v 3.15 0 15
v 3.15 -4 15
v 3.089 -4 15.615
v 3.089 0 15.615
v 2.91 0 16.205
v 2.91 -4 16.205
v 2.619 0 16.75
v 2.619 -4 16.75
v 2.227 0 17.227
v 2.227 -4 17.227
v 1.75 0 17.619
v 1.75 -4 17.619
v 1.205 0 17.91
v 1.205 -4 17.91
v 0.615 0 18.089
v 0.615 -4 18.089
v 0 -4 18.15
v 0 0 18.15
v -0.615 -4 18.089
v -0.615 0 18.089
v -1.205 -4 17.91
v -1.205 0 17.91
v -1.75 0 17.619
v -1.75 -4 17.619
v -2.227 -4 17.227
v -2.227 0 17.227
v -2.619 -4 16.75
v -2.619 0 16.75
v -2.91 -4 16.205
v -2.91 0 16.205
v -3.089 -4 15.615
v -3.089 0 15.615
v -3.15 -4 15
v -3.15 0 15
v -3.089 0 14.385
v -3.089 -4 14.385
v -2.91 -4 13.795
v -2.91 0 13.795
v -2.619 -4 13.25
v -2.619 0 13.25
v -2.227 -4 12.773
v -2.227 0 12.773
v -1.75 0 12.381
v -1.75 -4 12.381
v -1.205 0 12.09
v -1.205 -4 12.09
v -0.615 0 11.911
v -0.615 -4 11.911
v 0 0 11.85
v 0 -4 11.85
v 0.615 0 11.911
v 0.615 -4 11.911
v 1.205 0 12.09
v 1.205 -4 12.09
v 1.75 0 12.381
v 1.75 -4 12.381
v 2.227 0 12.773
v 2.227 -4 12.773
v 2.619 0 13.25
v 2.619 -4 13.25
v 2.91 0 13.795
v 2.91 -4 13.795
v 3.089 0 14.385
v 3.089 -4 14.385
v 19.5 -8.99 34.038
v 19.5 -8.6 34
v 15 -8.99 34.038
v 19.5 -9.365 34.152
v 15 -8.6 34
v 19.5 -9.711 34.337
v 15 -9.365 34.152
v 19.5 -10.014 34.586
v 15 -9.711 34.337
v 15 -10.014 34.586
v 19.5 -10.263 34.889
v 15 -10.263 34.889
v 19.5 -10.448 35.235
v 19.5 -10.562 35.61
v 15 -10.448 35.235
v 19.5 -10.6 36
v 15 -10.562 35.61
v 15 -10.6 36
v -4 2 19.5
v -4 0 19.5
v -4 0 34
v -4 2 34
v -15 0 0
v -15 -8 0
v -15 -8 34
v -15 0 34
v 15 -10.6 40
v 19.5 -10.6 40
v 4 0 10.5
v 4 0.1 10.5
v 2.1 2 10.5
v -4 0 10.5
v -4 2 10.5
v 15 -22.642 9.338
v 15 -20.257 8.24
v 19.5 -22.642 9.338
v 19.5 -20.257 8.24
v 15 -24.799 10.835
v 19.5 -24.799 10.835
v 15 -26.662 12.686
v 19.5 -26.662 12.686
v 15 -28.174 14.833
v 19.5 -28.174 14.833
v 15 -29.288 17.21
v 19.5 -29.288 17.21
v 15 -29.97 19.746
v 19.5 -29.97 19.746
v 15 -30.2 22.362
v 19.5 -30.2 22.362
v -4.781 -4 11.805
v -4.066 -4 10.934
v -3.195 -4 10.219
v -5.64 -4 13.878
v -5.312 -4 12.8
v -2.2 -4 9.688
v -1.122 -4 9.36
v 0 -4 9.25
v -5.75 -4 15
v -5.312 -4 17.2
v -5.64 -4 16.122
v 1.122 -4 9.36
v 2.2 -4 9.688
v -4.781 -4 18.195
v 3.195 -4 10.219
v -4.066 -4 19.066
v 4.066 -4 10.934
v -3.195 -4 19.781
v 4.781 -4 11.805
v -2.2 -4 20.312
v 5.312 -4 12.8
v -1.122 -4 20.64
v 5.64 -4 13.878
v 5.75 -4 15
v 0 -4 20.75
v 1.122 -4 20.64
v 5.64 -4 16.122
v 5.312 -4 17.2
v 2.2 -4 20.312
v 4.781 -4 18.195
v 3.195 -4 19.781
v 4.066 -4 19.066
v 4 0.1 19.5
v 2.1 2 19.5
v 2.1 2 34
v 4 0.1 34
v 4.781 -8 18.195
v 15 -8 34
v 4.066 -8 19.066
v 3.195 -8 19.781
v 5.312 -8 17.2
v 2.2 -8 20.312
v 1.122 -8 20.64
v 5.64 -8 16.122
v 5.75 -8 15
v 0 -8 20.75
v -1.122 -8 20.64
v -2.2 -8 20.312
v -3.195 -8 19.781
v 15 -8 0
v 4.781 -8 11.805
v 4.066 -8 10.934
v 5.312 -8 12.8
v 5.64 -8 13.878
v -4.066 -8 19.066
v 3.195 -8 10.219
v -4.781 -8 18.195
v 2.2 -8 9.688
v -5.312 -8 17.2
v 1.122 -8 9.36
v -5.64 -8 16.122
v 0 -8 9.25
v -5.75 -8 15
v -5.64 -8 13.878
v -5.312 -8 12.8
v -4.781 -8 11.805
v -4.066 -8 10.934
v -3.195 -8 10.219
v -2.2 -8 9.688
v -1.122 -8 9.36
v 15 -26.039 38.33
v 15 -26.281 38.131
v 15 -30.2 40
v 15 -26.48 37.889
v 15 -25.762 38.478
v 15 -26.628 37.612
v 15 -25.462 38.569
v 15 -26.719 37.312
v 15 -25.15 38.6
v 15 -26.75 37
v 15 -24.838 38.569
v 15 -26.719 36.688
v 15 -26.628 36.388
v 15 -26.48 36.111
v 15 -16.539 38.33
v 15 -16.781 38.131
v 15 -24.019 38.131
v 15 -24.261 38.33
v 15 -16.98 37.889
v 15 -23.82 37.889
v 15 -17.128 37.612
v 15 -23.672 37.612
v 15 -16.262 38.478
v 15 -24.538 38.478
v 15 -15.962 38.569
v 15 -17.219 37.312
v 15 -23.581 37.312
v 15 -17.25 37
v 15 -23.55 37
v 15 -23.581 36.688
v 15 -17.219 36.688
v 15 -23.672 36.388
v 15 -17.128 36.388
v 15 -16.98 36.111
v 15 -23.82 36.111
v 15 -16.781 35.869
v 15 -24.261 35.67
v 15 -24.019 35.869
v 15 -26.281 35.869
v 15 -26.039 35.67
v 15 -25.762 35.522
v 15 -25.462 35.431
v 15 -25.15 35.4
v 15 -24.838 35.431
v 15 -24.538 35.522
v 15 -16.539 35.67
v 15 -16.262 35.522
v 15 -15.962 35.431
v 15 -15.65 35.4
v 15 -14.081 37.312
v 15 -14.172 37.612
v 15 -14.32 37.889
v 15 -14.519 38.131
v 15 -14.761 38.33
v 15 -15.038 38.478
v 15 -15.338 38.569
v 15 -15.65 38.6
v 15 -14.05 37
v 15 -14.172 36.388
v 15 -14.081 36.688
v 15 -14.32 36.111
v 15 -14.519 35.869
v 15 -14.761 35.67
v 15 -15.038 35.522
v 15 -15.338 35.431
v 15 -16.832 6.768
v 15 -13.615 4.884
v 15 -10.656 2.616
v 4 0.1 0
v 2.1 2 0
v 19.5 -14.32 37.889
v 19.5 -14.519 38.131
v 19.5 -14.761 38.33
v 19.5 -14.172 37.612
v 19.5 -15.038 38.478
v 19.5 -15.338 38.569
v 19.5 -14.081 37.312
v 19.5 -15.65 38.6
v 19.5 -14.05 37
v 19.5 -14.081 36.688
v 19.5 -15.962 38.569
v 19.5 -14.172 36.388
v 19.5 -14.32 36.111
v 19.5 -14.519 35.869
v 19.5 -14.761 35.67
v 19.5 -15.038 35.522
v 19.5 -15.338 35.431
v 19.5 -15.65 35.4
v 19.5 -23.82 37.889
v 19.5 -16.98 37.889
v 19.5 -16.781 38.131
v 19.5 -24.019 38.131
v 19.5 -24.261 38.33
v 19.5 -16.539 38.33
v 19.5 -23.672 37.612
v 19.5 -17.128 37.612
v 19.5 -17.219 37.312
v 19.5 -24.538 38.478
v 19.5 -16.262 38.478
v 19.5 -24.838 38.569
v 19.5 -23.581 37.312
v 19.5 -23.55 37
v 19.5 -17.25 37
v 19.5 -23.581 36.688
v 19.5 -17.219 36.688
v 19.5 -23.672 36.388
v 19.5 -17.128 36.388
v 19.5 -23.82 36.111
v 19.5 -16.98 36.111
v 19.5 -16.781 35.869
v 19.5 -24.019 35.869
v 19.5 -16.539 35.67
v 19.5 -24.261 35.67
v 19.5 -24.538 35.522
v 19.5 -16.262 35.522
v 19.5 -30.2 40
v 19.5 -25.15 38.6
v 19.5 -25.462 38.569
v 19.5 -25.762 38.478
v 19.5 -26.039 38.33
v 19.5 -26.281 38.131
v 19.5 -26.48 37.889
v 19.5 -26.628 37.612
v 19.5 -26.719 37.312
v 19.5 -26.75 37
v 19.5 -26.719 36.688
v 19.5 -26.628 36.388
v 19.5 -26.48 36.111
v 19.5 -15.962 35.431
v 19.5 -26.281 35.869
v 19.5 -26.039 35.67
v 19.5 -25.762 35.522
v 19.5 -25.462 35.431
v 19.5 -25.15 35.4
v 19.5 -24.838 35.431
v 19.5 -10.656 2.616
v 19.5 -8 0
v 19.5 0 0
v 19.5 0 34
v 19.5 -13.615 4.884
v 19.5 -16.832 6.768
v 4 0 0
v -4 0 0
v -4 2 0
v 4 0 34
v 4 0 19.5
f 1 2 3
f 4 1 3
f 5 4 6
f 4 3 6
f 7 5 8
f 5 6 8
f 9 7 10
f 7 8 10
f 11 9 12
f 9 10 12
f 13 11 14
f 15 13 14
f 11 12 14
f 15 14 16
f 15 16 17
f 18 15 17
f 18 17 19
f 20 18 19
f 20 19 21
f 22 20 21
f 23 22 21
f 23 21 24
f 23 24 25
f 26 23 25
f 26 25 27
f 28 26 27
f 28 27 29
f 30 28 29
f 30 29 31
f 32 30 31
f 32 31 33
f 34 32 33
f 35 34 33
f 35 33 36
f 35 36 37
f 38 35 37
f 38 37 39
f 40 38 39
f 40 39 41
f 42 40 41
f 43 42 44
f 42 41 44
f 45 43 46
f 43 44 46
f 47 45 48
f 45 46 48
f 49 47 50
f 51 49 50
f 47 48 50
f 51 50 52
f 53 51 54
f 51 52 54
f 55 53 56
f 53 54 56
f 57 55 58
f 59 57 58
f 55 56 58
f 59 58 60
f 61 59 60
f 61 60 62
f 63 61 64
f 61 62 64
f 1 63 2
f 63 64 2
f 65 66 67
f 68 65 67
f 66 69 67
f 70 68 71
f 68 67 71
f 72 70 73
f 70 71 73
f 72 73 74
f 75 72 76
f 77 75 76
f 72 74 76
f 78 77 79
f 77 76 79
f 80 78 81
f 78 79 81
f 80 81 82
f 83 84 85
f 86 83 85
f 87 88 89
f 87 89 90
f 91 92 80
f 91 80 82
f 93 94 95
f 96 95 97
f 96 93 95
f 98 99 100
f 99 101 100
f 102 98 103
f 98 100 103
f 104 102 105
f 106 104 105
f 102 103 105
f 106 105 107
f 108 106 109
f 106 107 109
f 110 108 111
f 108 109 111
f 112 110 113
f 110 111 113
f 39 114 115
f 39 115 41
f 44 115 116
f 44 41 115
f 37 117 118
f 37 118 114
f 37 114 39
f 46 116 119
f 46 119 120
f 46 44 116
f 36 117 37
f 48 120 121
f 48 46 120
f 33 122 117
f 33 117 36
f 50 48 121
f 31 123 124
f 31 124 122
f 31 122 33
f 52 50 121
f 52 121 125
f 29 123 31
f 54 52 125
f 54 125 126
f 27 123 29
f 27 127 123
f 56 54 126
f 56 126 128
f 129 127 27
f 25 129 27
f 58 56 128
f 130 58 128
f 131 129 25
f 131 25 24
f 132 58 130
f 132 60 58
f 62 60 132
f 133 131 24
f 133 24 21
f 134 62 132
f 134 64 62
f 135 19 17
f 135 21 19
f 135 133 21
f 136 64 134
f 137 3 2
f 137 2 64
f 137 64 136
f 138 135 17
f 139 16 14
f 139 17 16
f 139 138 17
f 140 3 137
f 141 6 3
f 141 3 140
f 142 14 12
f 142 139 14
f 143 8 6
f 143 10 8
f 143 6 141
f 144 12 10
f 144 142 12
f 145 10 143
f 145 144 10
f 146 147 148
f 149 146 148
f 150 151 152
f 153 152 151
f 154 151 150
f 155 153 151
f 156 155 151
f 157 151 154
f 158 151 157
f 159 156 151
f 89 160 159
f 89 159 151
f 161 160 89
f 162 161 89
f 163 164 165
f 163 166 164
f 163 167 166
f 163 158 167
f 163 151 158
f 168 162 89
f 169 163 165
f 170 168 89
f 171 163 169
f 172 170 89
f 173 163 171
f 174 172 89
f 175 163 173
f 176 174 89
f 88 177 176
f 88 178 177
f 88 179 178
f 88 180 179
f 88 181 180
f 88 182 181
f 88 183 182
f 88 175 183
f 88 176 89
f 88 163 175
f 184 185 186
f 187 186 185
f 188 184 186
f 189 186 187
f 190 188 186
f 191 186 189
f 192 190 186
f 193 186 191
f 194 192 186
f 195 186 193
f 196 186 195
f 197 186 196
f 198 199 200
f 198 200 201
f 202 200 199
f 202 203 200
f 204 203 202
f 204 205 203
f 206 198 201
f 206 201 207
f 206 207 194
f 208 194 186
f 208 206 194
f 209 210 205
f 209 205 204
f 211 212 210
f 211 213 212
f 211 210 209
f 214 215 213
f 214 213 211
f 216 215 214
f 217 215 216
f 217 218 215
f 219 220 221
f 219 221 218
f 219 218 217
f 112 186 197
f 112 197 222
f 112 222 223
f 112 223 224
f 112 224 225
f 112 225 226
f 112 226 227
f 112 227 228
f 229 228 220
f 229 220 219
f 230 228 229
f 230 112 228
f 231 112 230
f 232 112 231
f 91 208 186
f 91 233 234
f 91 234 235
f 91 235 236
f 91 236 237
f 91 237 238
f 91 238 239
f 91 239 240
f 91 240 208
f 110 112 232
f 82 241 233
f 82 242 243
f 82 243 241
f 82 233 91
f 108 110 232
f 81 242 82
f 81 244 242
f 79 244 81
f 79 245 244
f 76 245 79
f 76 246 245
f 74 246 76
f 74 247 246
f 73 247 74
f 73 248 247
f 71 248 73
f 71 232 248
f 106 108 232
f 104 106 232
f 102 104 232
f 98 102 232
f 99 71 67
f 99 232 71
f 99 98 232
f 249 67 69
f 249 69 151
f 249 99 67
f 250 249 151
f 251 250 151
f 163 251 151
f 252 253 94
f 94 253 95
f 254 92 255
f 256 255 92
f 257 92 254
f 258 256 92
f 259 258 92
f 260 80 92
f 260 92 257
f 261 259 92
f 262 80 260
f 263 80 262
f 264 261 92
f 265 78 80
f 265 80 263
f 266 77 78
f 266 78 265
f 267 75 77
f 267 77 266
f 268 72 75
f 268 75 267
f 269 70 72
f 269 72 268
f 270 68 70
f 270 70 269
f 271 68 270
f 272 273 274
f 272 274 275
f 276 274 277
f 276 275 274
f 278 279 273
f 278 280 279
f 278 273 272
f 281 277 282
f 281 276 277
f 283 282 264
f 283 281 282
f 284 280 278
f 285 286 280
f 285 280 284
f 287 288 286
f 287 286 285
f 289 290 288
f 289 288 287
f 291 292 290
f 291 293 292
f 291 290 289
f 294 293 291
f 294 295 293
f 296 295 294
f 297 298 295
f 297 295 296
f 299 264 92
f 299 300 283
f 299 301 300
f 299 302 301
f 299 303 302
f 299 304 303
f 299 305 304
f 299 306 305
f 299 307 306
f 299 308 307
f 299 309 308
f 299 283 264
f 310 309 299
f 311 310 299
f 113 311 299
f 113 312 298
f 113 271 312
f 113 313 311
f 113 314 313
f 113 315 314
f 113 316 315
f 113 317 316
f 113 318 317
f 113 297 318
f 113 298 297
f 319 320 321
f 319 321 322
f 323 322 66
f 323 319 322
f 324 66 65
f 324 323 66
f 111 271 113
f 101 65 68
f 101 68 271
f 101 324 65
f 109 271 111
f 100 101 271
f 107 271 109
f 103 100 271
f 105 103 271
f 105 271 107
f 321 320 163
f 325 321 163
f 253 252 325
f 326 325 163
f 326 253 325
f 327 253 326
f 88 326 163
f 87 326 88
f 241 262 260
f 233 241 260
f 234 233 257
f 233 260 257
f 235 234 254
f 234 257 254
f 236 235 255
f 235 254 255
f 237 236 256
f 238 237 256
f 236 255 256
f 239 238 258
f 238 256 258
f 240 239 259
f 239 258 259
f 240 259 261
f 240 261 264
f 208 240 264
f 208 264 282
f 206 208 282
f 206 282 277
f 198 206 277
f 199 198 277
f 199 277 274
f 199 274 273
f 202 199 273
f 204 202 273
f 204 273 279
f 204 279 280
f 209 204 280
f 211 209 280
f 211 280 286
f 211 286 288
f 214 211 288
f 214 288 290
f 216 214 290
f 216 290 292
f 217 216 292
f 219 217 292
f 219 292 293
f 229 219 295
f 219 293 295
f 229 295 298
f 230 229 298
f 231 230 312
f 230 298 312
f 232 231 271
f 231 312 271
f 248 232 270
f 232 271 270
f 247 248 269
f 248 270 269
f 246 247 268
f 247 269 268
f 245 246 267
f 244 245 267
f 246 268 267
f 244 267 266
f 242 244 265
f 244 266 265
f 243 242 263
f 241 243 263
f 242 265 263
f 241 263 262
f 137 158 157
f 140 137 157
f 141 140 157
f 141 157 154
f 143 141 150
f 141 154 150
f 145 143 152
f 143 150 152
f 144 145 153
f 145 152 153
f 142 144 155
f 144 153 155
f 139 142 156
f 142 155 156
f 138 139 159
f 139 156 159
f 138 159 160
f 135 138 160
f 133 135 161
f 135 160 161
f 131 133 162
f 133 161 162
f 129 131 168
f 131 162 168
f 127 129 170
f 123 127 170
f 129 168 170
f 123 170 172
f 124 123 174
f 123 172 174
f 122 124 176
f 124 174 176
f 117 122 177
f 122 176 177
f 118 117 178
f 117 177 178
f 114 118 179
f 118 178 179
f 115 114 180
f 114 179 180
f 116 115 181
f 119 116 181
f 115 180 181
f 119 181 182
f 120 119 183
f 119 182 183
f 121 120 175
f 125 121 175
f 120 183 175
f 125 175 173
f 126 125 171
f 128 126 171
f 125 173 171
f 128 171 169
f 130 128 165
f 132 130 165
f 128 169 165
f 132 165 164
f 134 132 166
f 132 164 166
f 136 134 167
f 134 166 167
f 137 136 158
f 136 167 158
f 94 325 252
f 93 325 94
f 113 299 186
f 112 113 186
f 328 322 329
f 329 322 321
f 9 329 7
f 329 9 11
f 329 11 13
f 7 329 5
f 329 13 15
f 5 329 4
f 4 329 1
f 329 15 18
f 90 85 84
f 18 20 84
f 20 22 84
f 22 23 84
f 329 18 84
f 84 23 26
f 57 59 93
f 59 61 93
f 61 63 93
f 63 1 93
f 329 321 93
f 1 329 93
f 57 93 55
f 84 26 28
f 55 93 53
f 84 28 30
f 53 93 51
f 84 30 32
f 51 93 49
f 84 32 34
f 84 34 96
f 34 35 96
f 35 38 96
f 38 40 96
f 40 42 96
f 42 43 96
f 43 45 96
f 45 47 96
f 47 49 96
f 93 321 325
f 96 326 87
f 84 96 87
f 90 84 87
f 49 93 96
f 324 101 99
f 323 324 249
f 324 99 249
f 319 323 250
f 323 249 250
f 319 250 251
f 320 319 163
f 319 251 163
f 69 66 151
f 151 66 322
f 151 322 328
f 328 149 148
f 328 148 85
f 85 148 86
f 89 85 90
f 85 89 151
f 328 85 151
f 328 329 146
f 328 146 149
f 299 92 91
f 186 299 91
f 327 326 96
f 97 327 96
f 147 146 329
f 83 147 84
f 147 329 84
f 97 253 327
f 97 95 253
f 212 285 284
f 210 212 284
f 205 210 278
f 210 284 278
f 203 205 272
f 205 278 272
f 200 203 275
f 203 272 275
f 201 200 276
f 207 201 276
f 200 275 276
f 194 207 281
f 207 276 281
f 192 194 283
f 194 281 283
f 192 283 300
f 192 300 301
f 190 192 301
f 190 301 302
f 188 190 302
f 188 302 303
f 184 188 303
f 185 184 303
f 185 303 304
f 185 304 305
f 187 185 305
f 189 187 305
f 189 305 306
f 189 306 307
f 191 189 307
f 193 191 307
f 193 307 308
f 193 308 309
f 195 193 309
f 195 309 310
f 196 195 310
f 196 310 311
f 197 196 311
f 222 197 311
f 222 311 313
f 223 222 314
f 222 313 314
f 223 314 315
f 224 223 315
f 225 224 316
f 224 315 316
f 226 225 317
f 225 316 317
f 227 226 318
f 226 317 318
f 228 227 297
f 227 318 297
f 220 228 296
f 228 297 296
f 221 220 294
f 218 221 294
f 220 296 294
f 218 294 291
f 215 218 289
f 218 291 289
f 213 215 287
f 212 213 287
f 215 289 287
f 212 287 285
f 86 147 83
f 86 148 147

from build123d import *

# Parameters (mm, degrees)
PAD_DEPTH       = 40
SKETCH001_R     = 3.15
POCKET_DEPTH    = 8.001
POCKET001_DEPTH = 6
SKETCH003_R     = 5.75
POCKET002_DEPTH = 4
POCKET003_DEPTH = 4.501
FILLET_R        = 15
FILLET001_R     = 2
SKETCH005_R     = 1.6
POCKET004_DEPTH = 34.501
SKETCH006_W     = 8
SKETCH006_H     = 14.5
SKETCH006_H_2   = 10.5
PAD001_DEPTH    = 2
CHAMFER_SIZE    = 1.9


with BuildPart() as part:
    # Sketch → Pad (new body)
    with BuildSketch(Plane.XY):
        Polygon((-15, 0), (15, 0), (19.5, 0), (19.5, -30.2), (15, -30.2), (15, -8), (-15, -8), align=None)
    extrude(amount=PAD_DEPTH)

    # Sketch001 (on Face6 of Pad) → Pocket (cut, through all)
    with BuildSketch(Plane.XZ.offset(8)):
        with Locations((0, 15)):
            Circle(SKETCH001_R)
    extrude(amount=-POCKET_DEPTH, mode=Mode.SUBTRACT)

    # Sketch002 (on Face4 of Pocket) → Pocket001 (cut)
    with BuildSketch(Plane.XY.offset(40)):
        Polygon((-15, 0), (19.5, 0), (19.5, -10.6), (15, -10.6), (15, -8), (-15, -8), align=None)
    extrude(amount=-POCKET001_DEPTH, mode=Mode.SUBTRACT)

    # Sketch003 (on Face10 of Pocket001) → Pocket002 (cut)
    with BuildSketch(Plane.XZ.offset(8)):
        with Locations((0, 15)):
            Circle(SKETCH003_R)
    extrude(amount=-POCKET002_DEPTH, mode=Mode.SUBTRACT)

    # Sketch004 (on Face9 of Pocket002) → Pocket003 (cut, through all)
    with BuildSketch(Plane(origin=(15, 0, 0), x_dir=(0, -1, 0), z_dir=(-1, 0, 0))):
        with BuildLine():
            ThreePointArc((30.2, 10), (18.043042, 7.346447), (8, 0))
            Line((30.2, 0), (8, 0))
            Line((30.2, 10), (30.2, 0))
        make_face()
    extrude(amount=-POCKET003_DEPTH, mode=Mode.SUBTRACT)

    # Fillet
    fillet_edges = [part.edges().sort_by_distance(p)[0] for p in [
        (17.25, -30.2, 10),
    ]]
    fillet(fillet_edges, radius=FILLET_R)

    # Fillet001
    fillet001_edges = [part.edges().sort_by_distance(p)[0] for p in [
        (17.25, -10.6, 34),
    ]]
    fillet(fillet001_edges, radius=FILLET001_R)

    # Sketch005 (on Face10 of Fillet001) → Pocket004 (cut, through all)
    with BuildSketch(Plane.YZ.offset(19.5)):
        with Locations((-15.65, 37)):
            Circle(SKETCH005_R)
        with Locations((-25.15, 37)):
            Circle(SKETCH005_R)
    extrude(amount=-POCKET004_DEPTH, mode=Mode.SUBTRACT)

    # Sketch006 (on Face13 of Pocket004) → Pad001 (join)
    with BuildSketch(Plane(origin=(0, 0, 0), x_dir=(-1, 0, 0), z_dir=(0, 1, 0))):
        with Locations((0, 26.75)):
            Rectangle(SKETCH006_W, SKETCH006_H)
        with Locations((0, 5.25)):
            Rectangle(SKETCH006_W, SKETCH006_H_2)
    extrude(amount=PAD001_DEPTH)

    # Chamfer
    chamfer_edges = [part.edges().sort_by_distance(p)[0] for p in [
        (4, 2, 26.75),
        (4, 2, 5.25),
    ]]
    chamfer(chamfer_edges, length=CHAMFER_SIZE)


solid = part.part
